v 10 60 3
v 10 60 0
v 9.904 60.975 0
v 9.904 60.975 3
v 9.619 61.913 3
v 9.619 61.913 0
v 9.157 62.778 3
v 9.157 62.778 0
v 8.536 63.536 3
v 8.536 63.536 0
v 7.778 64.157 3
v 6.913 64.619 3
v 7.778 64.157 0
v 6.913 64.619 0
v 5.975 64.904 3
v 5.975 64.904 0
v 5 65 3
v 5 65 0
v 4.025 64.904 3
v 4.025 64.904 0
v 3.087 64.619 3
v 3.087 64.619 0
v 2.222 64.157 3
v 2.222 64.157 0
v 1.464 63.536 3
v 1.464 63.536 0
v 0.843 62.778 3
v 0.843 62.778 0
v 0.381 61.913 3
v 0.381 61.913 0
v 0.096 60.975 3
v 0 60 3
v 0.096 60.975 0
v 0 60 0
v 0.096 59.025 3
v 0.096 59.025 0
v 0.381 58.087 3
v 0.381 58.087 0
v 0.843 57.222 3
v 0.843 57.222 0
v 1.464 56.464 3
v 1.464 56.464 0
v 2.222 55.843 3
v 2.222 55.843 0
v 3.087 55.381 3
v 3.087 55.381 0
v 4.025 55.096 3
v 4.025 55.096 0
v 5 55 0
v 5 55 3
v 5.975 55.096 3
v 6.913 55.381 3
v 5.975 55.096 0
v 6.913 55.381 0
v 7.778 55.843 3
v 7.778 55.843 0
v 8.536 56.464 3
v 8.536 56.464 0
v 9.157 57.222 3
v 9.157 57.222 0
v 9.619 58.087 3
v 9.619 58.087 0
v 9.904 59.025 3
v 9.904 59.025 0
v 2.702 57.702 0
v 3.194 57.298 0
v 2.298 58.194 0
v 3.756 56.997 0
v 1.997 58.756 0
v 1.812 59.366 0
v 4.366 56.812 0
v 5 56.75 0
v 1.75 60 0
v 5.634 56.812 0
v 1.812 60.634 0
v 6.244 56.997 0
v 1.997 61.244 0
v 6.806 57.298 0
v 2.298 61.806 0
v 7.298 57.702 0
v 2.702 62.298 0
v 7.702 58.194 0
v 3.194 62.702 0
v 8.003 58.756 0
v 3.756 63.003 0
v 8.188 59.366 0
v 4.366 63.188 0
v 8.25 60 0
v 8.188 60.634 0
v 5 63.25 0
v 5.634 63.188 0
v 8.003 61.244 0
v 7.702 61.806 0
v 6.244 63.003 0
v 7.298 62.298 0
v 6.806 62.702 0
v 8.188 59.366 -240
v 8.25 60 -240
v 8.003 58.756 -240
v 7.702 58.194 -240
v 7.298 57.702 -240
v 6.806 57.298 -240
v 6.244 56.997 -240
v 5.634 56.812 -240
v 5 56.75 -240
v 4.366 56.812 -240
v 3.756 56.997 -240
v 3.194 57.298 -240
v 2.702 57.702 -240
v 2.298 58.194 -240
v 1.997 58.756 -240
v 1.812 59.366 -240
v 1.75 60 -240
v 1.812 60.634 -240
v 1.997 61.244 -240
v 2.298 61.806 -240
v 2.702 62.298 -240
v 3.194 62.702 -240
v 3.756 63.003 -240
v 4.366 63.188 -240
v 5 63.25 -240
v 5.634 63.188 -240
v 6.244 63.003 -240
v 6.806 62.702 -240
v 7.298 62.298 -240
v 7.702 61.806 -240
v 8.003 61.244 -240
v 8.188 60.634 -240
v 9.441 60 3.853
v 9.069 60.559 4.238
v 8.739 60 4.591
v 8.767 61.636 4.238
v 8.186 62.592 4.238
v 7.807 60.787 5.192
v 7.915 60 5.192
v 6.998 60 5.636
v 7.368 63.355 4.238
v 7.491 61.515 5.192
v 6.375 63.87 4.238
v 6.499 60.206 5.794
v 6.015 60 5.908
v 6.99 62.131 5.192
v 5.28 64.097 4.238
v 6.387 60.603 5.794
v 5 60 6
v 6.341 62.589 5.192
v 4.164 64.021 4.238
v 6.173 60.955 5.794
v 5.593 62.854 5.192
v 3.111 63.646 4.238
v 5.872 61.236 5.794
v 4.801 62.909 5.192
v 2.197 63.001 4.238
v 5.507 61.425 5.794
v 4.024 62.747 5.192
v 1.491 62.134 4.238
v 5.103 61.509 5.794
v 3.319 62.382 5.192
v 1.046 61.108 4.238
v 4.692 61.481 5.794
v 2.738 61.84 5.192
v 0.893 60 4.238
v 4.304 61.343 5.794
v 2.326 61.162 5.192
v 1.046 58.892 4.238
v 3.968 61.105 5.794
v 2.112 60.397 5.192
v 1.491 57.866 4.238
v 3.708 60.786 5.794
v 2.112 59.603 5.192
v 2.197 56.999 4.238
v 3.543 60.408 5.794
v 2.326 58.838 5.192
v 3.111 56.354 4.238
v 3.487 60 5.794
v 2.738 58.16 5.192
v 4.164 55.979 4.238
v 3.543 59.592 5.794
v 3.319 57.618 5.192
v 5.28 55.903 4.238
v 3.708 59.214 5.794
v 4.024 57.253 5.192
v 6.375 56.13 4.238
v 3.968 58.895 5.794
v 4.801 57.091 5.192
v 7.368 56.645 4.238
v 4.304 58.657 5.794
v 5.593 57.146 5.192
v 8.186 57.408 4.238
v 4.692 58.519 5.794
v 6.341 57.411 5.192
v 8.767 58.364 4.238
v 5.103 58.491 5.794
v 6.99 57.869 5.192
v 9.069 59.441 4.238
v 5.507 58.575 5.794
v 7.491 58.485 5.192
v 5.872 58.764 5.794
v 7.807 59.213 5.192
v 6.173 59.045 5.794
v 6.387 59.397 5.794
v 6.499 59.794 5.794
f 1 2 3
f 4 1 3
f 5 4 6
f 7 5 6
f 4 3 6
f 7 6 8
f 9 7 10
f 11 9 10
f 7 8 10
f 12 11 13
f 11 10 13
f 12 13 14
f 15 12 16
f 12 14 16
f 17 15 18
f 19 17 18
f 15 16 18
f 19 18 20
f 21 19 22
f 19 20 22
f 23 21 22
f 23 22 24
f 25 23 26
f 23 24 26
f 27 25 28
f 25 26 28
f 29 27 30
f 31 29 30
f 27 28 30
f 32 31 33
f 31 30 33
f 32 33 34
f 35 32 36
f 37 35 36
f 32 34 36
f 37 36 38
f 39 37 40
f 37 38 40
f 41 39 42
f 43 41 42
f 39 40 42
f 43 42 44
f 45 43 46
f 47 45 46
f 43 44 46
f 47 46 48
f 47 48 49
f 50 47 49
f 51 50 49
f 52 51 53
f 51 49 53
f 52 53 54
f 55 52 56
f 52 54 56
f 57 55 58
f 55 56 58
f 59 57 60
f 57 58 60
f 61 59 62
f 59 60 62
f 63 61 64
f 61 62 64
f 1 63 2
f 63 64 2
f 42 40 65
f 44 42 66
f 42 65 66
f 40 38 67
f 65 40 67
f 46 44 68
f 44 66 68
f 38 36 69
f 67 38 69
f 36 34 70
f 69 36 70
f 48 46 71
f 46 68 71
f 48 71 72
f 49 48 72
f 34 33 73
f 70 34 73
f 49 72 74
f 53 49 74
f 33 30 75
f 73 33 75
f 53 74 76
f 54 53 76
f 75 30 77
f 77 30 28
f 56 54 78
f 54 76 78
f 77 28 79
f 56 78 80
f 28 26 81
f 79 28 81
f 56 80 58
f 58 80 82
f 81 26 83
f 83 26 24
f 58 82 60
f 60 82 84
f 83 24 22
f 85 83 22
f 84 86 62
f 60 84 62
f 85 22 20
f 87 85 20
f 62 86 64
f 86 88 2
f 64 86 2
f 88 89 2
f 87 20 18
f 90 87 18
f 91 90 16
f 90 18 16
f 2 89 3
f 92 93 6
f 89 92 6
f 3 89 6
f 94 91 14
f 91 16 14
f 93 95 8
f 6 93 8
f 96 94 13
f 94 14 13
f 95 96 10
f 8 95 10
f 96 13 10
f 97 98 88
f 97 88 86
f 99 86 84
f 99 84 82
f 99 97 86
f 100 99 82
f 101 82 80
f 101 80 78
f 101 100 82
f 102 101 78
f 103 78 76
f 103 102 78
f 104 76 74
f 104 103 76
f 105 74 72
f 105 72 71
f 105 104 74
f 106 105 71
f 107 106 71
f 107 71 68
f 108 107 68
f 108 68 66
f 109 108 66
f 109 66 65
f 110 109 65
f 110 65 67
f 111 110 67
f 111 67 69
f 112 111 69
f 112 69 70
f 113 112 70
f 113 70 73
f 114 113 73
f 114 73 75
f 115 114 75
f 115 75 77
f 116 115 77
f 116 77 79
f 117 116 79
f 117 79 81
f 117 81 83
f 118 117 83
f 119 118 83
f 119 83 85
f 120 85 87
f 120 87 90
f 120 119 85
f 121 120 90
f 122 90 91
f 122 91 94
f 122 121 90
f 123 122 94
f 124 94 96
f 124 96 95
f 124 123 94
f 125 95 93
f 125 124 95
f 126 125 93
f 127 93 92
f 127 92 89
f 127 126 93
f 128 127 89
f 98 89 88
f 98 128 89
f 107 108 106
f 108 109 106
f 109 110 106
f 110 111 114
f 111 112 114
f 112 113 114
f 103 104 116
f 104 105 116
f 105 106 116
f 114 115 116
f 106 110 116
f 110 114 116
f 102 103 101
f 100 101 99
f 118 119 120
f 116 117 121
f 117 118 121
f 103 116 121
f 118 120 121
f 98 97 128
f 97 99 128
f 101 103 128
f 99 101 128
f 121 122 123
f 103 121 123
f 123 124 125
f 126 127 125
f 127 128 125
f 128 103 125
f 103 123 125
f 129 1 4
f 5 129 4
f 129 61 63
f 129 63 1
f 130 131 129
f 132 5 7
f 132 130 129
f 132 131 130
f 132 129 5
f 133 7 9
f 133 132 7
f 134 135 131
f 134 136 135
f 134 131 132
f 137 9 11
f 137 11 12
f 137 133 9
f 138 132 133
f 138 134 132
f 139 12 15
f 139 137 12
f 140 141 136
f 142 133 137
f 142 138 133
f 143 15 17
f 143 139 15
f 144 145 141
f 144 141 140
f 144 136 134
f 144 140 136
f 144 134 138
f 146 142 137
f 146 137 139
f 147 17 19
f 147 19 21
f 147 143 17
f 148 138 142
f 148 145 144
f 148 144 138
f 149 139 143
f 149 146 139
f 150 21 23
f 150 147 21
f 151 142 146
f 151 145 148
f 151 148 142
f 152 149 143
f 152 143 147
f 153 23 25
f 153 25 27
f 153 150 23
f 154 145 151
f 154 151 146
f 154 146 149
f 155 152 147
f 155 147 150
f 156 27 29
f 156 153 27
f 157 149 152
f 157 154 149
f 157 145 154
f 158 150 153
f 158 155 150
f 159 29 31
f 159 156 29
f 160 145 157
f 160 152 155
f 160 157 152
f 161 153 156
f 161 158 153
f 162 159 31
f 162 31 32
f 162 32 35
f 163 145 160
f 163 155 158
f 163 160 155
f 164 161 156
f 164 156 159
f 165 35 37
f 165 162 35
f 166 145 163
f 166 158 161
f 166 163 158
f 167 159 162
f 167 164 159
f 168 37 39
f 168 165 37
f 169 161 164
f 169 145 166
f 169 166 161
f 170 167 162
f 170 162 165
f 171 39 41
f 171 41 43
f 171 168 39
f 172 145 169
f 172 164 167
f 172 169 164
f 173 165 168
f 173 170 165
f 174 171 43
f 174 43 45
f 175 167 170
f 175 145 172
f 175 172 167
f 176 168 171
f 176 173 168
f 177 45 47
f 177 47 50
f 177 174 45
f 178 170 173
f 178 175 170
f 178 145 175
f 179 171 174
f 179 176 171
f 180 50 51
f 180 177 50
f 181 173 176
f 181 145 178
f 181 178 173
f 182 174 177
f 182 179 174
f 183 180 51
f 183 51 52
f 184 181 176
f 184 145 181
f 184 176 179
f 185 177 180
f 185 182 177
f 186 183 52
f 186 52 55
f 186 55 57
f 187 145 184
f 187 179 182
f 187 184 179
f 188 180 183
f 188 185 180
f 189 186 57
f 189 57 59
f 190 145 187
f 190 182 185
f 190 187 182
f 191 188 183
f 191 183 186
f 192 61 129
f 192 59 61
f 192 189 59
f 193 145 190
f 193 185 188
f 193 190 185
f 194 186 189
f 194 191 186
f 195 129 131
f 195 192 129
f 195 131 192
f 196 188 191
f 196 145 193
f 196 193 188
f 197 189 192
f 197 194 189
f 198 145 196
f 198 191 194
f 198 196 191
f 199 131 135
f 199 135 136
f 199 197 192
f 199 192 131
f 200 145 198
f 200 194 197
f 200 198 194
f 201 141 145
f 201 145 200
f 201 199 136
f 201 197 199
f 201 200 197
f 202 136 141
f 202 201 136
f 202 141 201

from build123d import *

# Parameters (mm, degrees)
SKETCH_1_R         = 3.25
SKETCH_3_R         = 5
EXTRUDE_1_DEPTH    = 3
DOME_1_FACE_RADIUS = 5
DOME_1_HEIGHT      = 3


with BuildPart() as part:
    # По траектории1: sweep along a path in Эскиз2
    with BuildLine(Plane(origin=(0, 0, -120), x_dir=(0, 0, -1), z_dir=(1, 0, 0))) as sweep_1_path:
        Line((-120, 0), (120, 0))
    # Эскиз1 → По траектории1 (sweep)
    with BuildSketch(Plane.XY):
        with Locations((5, 60)):
            Circle(SKETCH_1_R)
    sweep(path=sweep_1_path.line)

    # Эскиз3 → Бобышка-Вытянуть1 (add)
    with BuildSketch(Plane.XY):
        with Locations((5, 60)):
            Circle(SKETCH_3_R)
    extrude(amount=EXTRUDE_1_DEPTH)

    # Купол1: a dome of height H over a round flat face of radius A is a cap of a sphere of radius (A * A + H * H) / (2 * H)
    dome_1_r = (DOME_1_FACE_RADIUS * DOME_1_FACE_RADIUS + DOME_1_HEIGHT * DOME_1_HEIGHT) / (2 * DOME_1_HEIGHT)
    dome_1_base = Plane((5, 60, 3), z_dir=(0, 0, 1))
    with Locations(dome_1_base.offset(DOME_1_HEIGHT - dome_1_r)):
        dome_1_ball = Sphere(dome_1_r, mode=Mode.PRIVATE)
    add(split(dome_1_ball, bisect_by=dome_1_base, keep=Keep.TOP, mode=Mode.PRIVATE))


solid = part.part
